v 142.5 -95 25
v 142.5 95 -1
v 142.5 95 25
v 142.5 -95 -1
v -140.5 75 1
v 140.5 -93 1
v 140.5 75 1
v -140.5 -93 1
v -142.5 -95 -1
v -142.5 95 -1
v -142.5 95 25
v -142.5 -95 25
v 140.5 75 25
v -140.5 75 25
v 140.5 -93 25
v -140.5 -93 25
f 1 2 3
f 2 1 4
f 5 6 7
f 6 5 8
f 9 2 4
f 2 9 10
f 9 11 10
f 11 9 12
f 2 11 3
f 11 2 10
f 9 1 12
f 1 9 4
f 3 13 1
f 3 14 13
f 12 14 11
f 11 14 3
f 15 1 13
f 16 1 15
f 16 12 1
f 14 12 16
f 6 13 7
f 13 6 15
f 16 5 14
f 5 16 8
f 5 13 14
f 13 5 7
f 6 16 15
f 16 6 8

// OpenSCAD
// Units in mm

width = 285;
depth = 190;

keyboardHeight = 25;

wallWidth = 2;
hingeWall = 20;

cube([width, depth, wallWidth], true);

translate([width / 2 - wallWidth, -depth / 2, 0]) {
    cube([wallWidth, depth, keyboardHeight], false);
}

translate([-width / 2, -depth / 2, 0]) {
    cube([wallWidth, depth, keyboardHeight], false);
}
    
translate([-width / 2, depth / 2 - hingeWall, 0]) {
    cube([width, hingeWall, keyboardHeight], false);
}

translate([-width / 2, -depth / 2, 0]) {
    cube([width, wallWidth, keyboardHeight], false);
}
